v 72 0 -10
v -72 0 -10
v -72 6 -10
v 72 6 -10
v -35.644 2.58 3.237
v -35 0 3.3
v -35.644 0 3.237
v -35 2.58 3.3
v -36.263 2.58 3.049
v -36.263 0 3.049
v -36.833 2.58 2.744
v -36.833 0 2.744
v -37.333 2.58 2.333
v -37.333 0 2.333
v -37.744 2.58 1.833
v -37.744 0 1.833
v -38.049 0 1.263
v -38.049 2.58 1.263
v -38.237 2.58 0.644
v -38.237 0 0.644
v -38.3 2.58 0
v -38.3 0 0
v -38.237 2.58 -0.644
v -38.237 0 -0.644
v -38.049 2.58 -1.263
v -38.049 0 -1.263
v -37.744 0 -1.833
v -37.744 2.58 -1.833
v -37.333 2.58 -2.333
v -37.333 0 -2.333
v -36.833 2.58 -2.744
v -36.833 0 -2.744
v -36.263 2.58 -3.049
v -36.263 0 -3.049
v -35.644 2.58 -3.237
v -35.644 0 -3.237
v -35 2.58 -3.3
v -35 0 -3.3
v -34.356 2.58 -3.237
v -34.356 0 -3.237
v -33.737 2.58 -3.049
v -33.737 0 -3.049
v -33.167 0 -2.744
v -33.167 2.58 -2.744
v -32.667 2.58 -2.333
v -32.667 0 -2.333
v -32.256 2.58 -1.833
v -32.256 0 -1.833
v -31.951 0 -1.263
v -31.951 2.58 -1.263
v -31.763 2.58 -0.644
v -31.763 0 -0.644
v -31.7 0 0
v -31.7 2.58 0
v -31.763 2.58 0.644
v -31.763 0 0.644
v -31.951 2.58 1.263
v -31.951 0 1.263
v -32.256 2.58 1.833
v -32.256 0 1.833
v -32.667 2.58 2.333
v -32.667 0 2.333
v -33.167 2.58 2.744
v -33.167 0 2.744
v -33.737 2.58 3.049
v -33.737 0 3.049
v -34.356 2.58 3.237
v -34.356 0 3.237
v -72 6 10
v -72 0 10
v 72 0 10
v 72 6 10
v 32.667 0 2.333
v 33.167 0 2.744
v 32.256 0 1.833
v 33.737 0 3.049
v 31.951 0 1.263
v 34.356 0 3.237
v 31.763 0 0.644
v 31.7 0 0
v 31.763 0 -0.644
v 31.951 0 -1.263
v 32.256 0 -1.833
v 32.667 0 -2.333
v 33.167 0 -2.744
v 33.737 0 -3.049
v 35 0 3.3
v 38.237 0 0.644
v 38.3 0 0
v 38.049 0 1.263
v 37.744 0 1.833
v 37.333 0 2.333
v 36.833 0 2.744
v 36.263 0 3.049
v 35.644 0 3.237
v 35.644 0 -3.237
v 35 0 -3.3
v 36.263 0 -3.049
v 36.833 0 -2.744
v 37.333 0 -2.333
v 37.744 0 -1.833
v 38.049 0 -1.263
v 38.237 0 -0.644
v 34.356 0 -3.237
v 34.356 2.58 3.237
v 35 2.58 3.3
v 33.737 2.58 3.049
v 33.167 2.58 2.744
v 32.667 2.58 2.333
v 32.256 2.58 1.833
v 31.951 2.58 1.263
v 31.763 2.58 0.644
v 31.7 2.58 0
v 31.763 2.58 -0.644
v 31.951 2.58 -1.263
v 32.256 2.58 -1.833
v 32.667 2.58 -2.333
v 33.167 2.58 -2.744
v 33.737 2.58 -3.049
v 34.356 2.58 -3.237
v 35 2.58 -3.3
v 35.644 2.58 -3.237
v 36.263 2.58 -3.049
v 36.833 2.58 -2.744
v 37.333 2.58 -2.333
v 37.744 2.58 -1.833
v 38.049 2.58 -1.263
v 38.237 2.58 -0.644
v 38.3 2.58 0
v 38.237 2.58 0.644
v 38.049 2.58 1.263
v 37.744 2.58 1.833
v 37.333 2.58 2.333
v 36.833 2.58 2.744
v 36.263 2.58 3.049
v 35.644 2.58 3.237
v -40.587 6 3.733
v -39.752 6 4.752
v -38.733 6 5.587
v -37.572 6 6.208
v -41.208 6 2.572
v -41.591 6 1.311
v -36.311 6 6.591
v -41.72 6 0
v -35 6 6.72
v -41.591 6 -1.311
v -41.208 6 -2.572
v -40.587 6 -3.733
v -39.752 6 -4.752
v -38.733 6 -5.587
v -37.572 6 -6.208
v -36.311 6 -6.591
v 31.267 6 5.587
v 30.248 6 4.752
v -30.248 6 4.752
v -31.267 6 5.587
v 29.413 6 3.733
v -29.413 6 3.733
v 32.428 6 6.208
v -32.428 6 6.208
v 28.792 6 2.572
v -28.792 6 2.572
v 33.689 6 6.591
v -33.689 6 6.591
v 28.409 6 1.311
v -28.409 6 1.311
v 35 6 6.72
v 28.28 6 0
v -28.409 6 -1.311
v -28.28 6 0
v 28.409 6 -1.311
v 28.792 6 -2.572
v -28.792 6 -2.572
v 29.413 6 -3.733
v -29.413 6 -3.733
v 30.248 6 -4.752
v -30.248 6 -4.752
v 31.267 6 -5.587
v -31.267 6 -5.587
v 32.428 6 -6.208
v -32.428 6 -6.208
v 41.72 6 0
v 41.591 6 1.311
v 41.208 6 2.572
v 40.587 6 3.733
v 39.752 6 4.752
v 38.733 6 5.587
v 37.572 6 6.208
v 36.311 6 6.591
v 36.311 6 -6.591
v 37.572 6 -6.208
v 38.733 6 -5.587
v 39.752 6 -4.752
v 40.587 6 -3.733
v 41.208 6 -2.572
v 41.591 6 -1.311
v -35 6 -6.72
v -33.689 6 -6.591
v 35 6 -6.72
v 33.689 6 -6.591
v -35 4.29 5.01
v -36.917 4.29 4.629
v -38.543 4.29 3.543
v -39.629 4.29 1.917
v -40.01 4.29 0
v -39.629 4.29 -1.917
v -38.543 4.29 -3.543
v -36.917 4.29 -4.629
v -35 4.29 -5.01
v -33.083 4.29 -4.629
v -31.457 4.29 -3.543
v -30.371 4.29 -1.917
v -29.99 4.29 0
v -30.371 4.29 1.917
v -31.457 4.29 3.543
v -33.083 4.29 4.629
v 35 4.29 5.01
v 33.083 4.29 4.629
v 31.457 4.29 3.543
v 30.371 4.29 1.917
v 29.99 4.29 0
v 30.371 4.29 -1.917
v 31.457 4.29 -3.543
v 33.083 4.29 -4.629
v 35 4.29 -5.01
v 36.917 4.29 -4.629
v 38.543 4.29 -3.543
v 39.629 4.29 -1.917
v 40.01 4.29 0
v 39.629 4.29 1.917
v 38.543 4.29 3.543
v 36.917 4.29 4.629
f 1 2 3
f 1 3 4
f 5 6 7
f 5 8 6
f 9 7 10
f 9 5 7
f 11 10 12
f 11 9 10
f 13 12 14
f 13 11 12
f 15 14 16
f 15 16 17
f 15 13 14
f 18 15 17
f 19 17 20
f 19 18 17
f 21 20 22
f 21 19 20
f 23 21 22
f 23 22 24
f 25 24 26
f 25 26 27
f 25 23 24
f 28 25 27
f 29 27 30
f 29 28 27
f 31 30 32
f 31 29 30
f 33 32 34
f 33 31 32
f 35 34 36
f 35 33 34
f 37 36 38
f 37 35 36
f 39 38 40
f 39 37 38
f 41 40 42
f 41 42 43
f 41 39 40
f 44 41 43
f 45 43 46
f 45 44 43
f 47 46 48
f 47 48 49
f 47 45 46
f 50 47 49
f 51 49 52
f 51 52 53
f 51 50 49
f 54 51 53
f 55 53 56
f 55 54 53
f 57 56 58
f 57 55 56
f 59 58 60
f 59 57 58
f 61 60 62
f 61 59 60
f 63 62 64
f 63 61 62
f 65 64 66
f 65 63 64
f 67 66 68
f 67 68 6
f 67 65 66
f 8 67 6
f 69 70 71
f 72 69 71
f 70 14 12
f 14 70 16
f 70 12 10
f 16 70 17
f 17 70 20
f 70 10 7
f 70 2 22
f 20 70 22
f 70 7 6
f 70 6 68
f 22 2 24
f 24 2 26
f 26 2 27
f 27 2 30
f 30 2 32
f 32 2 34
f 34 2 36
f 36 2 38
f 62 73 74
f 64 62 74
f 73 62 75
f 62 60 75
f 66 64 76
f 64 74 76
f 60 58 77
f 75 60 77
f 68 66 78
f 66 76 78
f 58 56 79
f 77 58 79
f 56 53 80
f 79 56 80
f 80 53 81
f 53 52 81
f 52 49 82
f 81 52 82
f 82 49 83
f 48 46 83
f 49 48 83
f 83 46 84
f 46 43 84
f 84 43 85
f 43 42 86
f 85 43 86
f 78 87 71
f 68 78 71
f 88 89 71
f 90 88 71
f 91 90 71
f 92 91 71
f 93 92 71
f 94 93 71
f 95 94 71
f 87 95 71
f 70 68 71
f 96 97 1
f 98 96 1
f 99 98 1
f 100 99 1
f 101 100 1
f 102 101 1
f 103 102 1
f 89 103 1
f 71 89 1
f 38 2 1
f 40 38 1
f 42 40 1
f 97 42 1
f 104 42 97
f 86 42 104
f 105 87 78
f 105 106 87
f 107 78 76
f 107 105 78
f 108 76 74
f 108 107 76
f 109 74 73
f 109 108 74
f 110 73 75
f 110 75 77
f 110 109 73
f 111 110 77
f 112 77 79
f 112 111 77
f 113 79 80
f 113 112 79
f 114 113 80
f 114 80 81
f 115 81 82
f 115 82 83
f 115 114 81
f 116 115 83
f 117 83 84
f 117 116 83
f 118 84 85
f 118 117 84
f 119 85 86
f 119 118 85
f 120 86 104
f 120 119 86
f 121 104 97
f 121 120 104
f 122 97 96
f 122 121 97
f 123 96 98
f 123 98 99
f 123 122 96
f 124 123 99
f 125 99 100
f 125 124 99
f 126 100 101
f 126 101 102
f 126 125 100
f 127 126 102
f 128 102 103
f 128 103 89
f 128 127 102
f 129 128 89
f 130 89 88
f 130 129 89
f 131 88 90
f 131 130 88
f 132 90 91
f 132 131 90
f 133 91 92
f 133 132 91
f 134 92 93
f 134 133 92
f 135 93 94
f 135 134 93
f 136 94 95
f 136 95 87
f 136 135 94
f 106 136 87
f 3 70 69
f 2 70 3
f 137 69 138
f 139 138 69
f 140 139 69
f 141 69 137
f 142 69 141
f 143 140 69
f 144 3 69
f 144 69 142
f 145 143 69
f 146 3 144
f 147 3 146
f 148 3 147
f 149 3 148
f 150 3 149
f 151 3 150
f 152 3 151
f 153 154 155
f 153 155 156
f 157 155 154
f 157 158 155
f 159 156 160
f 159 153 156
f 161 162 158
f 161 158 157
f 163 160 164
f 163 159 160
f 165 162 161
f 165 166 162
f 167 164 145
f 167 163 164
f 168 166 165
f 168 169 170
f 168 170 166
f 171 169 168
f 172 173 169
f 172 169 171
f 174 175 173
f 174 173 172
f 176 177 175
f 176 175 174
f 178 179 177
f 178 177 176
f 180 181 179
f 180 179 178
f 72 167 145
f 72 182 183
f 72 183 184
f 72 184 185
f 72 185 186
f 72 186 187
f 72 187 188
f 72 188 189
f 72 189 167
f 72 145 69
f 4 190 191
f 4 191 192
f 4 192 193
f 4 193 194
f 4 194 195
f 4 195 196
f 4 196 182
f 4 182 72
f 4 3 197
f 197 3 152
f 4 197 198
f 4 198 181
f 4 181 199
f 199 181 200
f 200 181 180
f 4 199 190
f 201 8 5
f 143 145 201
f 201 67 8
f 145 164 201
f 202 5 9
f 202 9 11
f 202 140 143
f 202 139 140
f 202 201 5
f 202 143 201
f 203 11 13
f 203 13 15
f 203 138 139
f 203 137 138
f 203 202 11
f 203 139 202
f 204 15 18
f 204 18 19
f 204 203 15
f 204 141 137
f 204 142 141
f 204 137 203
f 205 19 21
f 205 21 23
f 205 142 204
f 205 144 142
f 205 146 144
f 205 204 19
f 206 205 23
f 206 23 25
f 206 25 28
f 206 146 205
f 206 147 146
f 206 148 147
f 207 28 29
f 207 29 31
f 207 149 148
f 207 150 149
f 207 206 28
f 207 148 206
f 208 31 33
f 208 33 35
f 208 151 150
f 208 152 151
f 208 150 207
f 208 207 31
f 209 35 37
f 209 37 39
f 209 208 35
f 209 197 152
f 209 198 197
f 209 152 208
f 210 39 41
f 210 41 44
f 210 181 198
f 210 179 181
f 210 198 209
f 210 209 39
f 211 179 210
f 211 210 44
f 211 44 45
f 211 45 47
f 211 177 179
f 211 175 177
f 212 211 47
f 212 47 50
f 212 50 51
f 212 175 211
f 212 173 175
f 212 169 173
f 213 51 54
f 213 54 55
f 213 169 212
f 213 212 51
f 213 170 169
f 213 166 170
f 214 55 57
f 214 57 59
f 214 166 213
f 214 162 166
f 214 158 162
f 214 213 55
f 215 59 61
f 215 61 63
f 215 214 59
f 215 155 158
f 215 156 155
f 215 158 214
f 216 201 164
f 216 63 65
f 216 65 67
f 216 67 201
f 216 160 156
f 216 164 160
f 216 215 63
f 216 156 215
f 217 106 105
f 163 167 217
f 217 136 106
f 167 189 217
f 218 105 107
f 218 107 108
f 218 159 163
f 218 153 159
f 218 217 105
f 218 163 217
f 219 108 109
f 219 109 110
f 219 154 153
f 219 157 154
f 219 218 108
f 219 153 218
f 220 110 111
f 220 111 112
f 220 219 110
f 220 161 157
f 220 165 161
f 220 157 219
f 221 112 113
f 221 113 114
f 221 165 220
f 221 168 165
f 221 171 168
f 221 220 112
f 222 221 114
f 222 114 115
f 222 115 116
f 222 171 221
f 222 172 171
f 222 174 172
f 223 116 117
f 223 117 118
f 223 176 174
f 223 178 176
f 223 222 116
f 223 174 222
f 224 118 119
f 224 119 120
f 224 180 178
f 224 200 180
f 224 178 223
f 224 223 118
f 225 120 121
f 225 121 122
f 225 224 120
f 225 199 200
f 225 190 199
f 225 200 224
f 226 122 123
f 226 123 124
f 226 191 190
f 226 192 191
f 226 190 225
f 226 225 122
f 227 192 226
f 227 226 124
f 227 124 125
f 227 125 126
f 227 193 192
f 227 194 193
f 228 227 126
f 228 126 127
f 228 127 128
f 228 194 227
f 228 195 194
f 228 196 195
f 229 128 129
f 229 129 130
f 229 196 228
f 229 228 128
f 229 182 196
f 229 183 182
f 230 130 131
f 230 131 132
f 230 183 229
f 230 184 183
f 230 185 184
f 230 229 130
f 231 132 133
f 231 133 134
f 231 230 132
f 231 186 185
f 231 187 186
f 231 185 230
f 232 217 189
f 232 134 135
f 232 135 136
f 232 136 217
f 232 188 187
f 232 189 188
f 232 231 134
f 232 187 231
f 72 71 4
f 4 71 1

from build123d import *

# Parameters (mm, degrees)
SKETCH1_W                           = 144
SKETCH1_H                           = 20
EXTRUDE1_DEPTH                      = 6
ESCAREADO_PARA_SFHCS_M61_AT_2_COUNT = 2
ESCAREADO_PARA_SFHCS_M61_AT_2_PITCH = 70


with BuildPart() as part:
    # Sketch1 → Extrude1 (new body)
    with BuildSketch(Plane(origin=(0, 0, 0), x_dir=(1, 0, 0), z_dir=(0, 1, 0))):
        Rectangle(SKETCH1_W, SKETCH1_H)
    extrude(amount=EXTRUDE1_DEPTH)

    # Esboço1 → Escareado para SFHCS M61 (revolve, cut)
    with BuildSketch(Plane(origin=(-35, 6, 0), x_dir=(0, 0, 1), z_dir=(1, 0, 0))):
        Polygon((0, 0), (0, 6), (3.3, 6), (3.3, 3.42), (6.72, 0), align=None)
    escareado_para_sfhcs_m61 = revolve(axis=Axis((-35, 12.35, 0), (0, -1, 0)), mode=Mode.SUBTRACT)

    # Escareado para SFHCS M61 at 2: Escareado para SFHCS M61 ×2
    with Locations(*[(i * ESCAREADO_PARA_SFHCS_M61_AT_2_PITCH, 0, 0) for i in range(1, ESCAREADO_PARA_SFHCS_M61_AT_2_COUNT)]):
        add(escareado_para_sfhcs_m61, mode=Mode.SUBTRACT)


solid = part.part
